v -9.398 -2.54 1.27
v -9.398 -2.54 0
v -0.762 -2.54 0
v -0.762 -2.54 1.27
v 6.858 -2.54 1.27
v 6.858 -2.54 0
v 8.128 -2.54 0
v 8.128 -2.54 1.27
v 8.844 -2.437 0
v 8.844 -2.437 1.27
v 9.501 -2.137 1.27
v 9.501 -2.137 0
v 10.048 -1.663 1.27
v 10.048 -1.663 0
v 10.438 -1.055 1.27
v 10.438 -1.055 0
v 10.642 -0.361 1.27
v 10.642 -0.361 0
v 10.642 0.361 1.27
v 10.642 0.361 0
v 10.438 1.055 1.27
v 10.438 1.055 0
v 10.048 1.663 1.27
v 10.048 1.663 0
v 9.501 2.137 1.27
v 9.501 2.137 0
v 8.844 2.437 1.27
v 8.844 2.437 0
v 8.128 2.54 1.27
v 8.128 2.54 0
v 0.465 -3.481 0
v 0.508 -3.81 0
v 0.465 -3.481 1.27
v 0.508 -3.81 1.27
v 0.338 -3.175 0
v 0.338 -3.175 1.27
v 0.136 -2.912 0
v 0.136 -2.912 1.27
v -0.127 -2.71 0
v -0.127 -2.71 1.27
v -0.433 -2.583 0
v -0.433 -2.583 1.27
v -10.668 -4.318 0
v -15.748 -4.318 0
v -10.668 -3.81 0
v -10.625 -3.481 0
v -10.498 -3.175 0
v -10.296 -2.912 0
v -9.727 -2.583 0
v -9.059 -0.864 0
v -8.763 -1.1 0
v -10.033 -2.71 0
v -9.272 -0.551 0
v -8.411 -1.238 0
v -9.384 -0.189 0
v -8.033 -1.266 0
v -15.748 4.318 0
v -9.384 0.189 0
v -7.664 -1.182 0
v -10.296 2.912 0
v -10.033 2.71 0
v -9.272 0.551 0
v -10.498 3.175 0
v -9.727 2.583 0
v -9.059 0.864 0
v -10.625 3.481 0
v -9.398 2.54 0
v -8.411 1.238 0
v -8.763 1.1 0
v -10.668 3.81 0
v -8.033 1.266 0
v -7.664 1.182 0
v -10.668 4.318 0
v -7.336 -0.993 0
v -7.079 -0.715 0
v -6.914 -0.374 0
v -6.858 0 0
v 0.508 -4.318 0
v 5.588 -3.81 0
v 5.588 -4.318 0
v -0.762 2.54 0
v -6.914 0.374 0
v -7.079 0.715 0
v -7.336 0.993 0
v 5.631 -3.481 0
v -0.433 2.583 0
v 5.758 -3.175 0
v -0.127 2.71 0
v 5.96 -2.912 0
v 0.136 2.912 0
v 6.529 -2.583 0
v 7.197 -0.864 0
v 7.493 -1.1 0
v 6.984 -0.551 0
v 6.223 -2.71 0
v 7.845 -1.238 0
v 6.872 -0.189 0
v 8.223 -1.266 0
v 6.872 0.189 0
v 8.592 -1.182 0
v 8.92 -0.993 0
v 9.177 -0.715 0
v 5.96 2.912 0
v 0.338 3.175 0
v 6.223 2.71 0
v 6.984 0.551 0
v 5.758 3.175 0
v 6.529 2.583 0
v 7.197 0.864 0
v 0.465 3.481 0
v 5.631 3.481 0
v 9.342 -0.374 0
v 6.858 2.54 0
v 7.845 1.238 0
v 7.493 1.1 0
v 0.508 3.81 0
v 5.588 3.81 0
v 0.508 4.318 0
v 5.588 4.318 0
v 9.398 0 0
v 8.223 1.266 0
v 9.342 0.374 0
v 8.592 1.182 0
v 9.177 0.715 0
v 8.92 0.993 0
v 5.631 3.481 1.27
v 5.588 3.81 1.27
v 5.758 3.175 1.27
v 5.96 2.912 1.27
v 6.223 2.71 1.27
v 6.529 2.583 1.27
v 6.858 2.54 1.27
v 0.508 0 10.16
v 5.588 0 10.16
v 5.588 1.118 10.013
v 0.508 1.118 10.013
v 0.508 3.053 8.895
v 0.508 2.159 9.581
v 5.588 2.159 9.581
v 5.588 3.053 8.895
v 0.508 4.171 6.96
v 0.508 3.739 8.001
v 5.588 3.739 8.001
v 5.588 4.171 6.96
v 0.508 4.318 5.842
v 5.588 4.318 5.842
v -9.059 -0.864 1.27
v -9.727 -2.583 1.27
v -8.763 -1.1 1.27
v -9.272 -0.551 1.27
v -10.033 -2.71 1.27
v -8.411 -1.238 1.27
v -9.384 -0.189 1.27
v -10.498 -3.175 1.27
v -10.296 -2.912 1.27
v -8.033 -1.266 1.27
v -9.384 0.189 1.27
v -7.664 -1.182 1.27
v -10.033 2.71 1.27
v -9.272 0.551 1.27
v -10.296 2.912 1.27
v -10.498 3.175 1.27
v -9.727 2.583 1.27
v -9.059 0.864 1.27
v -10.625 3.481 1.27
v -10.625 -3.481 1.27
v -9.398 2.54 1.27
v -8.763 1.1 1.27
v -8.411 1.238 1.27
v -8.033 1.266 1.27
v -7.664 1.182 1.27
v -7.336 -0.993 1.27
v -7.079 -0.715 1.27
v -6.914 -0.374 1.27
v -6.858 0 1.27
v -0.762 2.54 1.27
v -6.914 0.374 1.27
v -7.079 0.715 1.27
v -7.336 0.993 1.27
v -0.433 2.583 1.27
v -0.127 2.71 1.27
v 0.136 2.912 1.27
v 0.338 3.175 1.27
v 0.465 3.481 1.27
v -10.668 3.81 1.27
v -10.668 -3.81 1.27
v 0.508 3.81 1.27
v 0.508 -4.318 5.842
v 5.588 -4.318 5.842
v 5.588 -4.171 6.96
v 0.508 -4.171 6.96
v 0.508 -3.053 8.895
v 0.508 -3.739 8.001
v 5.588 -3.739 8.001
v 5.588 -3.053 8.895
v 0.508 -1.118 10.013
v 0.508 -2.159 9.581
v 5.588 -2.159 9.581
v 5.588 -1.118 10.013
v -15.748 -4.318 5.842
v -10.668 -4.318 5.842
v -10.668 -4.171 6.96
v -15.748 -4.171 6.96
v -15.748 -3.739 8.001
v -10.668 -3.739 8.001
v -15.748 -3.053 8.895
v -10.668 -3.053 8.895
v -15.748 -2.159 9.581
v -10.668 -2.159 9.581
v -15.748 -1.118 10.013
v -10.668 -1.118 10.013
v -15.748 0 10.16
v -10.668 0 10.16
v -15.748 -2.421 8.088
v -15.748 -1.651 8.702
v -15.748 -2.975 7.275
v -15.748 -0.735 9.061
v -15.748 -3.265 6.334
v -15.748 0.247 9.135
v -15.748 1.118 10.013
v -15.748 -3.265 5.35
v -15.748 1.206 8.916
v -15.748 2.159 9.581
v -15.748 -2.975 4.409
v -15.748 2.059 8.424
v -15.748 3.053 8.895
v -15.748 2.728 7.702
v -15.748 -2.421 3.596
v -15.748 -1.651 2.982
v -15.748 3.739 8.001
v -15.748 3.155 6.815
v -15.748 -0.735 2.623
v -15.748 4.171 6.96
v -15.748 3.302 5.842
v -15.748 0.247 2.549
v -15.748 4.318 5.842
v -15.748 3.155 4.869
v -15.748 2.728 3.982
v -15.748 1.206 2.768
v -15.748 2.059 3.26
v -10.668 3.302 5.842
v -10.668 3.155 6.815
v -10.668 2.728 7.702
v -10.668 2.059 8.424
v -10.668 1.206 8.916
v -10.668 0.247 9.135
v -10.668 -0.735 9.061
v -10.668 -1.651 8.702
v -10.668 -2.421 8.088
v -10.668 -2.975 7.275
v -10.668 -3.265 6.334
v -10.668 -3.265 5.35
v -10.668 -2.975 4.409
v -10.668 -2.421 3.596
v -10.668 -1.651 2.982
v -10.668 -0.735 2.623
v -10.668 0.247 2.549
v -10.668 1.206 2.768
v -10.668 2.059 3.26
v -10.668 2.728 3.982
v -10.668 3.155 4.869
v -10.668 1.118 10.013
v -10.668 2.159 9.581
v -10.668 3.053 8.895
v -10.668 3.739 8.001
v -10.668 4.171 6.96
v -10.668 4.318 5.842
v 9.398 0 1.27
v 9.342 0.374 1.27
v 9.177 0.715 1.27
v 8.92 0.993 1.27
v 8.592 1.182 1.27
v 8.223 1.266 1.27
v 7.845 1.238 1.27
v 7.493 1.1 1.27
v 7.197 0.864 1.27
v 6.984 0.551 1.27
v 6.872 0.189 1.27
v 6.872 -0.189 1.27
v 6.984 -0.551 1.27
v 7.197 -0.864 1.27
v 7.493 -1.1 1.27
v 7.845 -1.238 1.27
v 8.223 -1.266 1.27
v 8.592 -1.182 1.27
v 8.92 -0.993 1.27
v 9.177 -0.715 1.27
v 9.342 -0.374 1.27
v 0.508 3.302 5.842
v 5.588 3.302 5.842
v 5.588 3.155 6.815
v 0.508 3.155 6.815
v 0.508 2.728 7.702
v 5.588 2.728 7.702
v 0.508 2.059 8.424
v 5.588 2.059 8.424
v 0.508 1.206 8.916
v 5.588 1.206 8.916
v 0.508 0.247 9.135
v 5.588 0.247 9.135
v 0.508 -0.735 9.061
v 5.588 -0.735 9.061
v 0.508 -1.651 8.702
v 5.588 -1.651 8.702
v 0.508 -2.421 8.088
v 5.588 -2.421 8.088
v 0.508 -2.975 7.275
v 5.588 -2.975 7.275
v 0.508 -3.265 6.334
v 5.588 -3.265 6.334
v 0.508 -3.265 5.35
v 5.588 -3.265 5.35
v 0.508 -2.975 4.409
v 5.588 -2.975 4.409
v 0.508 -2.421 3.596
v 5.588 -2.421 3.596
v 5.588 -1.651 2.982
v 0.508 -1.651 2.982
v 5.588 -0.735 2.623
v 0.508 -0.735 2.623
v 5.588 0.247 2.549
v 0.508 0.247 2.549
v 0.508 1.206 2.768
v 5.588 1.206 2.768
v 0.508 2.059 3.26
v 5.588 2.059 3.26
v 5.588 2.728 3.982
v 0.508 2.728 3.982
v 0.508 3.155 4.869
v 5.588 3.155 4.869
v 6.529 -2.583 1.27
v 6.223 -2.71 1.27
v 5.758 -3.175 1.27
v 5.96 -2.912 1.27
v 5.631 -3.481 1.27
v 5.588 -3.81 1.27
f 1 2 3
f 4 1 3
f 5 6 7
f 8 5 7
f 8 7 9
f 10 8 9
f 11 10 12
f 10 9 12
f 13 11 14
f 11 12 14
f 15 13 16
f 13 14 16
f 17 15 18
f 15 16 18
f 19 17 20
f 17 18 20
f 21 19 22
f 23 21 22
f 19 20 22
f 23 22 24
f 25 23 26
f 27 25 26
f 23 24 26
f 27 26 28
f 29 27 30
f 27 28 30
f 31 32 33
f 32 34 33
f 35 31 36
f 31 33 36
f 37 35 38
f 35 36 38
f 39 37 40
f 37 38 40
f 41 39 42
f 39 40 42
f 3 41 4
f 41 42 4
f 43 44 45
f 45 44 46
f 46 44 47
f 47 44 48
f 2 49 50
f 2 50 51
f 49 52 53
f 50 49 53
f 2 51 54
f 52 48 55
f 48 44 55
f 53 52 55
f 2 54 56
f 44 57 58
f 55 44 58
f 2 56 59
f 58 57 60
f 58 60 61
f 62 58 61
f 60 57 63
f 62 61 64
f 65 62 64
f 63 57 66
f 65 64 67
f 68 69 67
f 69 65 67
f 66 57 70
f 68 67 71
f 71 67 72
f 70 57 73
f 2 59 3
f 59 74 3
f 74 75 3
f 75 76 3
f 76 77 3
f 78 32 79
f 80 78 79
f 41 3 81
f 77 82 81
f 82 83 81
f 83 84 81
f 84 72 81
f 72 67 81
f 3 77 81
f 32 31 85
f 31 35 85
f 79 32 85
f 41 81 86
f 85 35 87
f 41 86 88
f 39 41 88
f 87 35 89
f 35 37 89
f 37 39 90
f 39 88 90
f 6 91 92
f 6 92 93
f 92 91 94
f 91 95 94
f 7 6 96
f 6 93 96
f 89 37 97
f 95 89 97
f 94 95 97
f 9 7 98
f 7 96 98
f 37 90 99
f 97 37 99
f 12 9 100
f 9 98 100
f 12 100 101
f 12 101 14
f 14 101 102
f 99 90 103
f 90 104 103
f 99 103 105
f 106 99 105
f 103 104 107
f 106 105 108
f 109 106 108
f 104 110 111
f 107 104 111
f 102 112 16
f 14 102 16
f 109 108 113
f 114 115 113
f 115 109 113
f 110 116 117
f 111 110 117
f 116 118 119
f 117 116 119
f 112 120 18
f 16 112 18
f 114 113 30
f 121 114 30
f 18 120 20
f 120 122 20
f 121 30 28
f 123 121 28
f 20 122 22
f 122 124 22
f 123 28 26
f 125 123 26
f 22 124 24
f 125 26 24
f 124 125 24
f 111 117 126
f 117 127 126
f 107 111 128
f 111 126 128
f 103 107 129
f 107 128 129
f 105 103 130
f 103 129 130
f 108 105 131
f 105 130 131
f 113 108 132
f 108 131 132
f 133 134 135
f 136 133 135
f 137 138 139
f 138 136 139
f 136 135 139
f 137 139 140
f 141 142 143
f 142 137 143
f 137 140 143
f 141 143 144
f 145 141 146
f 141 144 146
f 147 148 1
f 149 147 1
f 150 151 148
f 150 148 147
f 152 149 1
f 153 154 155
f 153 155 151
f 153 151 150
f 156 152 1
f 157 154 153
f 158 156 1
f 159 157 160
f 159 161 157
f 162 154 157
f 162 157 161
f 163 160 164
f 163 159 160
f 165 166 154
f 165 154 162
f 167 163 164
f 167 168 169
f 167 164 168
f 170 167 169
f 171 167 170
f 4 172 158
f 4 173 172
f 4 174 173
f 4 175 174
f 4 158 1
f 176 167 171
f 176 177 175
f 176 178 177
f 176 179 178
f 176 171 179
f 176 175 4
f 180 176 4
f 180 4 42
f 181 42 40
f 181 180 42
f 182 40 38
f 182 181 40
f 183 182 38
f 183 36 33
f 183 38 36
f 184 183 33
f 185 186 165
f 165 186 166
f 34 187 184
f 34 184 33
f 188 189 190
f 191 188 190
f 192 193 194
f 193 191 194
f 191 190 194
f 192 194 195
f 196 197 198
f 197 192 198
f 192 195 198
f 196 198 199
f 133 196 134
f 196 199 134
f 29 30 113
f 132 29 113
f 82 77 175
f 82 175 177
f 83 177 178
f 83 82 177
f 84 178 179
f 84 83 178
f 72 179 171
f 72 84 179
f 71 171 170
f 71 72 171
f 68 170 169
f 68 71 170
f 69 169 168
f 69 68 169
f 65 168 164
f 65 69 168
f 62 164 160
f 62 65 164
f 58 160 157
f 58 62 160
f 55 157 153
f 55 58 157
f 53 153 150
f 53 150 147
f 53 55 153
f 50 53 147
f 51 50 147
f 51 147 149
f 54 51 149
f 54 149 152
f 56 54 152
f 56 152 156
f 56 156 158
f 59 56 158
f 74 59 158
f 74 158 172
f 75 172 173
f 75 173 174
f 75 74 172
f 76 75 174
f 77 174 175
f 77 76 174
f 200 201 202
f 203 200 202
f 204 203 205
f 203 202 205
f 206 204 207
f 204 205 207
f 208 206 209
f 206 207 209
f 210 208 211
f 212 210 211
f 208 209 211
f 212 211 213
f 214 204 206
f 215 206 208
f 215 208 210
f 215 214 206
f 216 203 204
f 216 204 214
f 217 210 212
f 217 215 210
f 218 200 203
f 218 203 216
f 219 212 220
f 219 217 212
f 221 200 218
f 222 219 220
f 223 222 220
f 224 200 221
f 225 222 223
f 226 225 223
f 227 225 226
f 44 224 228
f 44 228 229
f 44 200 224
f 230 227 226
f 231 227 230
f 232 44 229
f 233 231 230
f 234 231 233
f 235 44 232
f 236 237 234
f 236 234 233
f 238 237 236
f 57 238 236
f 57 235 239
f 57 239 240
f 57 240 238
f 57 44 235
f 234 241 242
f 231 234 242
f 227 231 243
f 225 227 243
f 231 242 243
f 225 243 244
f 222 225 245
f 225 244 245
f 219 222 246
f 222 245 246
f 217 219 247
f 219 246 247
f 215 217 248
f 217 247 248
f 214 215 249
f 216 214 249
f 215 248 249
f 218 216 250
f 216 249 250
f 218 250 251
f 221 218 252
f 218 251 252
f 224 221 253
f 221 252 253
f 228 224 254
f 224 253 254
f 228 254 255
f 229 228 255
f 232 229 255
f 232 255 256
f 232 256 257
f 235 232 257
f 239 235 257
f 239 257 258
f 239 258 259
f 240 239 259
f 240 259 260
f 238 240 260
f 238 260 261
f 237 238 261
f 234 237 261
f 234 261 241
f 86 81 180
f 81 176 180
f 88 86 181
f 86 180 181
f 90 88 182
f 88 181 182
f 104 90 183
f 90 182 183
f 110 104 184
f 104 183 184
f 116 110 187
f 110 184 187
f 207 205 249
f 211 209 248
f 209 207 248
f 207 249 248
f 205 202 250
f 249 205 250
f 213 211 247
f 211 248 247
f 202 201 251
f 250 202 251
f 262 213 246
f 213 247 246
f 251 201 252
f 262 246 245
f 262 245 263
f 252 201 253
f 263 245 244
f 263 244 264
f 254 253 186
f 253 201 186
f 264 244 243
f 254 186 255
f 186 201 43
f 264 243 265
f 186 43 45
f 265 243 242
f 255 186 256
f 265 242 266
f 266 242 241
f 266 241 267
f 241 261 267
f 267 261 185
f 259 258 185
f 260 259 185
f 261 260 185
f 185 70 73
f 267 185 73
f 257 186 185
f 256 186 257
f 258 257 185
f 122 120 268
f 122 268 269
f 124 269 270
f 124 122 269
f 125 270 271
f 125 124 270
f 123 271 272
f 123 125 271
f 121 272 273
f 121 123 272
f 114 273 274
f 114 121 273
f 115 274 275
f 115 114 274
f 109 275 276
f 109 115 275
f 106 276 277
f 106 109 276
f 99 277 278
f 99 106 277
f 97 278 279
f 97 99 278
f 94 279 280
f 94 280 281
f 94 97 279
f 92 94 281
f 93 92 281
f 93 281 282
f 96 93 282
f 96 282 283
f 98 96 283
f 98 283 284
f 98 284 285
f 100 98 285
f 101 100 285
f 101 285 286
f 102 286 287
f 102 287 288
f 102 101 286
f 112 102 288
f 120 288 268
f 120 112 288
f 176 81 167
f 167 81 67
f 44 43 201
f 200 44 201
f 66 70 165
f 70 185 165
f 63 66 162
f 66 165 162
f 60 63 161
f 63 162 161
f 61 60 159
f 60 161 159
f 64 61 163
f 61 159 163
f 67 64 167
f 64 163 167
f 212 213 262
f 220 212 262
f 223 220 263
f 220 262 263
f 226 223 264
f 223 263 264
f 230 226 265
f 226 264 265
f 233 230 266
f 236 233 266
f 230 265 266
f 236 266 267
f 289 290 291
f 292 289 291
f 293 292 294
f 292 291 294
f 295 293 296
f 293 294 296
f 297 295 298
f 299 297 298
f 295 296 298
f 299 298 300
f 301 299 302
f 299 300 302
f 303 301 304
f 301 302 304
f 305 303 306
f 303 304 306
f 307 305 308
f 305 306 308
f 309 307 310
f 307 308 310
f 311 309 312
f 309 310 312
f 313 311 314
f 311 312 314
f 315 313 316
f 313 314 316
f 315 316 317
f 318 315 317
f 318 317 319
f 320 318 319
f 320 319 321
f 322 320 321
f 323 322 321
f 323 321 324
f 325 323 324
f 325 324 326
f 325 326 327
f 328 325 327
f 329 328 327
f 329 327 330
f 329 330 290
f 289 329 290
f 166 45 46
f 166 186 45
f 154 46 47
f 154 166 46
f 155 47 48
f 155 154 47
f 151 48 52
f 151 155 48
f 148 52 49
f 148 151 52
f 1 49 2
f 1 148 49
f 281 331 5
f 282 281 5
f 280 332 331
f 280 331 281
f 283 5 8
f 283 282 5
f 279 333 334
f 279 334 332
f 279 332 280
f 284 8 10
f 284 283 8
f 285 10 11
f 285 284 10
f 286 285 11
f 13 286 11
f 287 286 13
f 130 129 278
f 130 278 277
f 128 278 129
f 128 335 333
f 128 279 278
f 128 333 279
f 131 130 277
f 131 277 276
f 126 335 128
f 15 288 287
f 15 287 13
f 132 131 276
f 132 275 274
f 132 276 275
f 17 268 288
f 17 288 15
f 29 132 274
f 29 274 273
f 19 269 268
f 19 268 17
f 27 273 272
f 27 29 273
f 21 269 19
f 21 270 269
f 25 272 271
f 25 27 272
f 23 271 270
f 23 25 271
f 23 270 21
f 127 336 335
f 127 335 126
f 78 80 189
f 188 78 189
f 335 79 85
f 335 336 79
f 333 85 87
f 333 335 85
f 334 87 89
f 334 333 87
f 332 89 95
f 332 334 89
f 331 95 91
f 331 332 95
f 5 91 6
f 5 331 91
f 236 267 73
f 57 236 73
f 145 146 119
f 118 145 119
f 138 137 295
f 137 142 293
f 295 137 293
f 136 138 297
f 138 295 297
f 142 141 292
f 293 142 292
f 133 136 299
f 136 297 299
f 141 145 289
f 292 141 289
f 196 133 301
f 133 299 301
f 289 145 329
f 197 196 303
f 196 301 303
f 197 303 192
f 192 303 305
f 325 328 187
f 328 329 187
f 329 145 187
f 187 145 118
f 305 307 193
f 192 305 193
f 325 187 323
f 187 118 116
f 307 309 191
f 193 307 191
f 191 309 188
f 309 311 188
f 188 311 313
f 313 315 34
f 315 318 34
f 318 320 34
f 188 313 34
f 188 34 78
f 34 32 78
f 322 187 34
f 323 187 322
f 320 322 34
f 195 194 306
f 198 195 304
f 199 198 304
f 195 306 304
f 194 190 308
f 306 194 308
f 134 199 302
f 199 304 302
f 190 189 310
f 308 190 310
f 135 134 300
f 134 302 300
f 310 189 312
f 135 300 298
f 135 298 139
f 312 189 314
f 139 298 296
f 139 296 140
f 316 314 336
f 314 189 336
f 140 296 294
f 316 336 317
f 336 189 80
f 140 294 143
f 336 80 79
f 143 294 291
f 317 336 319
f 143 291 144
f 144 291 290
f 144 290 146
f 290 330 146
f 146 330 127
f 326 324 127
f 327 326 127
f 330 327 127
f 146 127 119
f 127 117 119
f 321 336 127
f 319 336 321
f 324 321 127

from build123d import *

# Parameters (mm, degrees)
F0_R     = 1.27
F1_DEPTH = 1.27
F2_W     = 5.08
F2_H     = 11.43
F3_DEPTH = 8.89
F4_R     = 3.302
F5_DEPTH = 21.336
F6_R     = 1.27


with BuildPart() as f1:
    # F0 (on Top) → F1 (new body)
    with BuildSketch(Plane.XY):
        with BuildLine():
            Line((-10.668, 5.715), (-15.748, 5.715))
            Line((-15.748, 5.715), (-15.748, -5.715))
            Line((-15.748, -5.715), (-10.668, -5.715))
            Line((-10.668, -5.715), (-10.668, -2.54))
            Line((-10.668, -2.54), (0.508, -2.54))
            Line((0.508, -2.54), (0.508, -5.715))
            Line((0.508, -5.715), (5.588, -5.715))
            Line((5.588, -5.715), (5.588, -2.54))
            Line((5.588, -2.54), (8.128, -2.54))
            ThreePointArc((8.128, -2.54), (10.668, 0), (8.128, 2.54))
            Line((8.128, 2.54), (5.588, 2.54))
            Line((5.588, 2.54), (5.588, 5.715))
            Line((5.588, 5.715), (0.508, 5.715))
            Line((0.508, 5.715), (0.508, 2.54))
            Line((0.508, 2.54), (-10.668, 2.54))
            Line((-10.668, 2.54), (-10.668, 5.715))
        make_face()
        with Locations((-8.128, 0)):
            Circle(F0_R, mode=Mode.SUBTRACT)
        with Locations((8.128, 0)):
            Circle(F0_R, mode=Mode.SUBTRACT)
    extrude(amount=F1_DEPTH)

    # F2 (on face) → F3 (join)
    with BuildSketch(Plane.XY.offset(1.27)):
        with Locations((-13.208, 0)):
            Rectangle(F2_W, F2_H)
        with Locations((3.048, 0)):
            Rectangle(F2_W, F2_H)
    extrude(amount=F3_DEPTH)

    # F4 (on face) → F5 (cut, through all)
    with BuildSketch(Plane.YZ.offset(5.588)):
        with Locations((0, 5.842)):
            Circle(F4_R)
        with BuildLine():
            Line((5.715, 10.16), (0, 10.16))
            ThreePointArc((0, 10.16), (3.053287, 8.895287), (4.318, 5.842))
            Line((4.318, 5.842), (4.318, 0))
            Line((4.318, 0), (5.715, 0))
            Line((5.715, 0), (5.715, 10.16))
        make_face()
        with BuildLine():
            Line((-5.715, 0), (-4.318, 0))
            Line((-4.318, 0), (-4.318, 5.842))
            ThreePointArc((-4.318, 5.842), (-3.053287, 8.895287), (0, 10.16))
            Line((0, 10.16), (-5.715, 10.16))
            Line((-5.715, 10.16), (-5.715, 0))
        make_face()
    extrude(amount=-F5_DEPTH, mode=Mode.SUBTRACT)

    # F6
    f6_edges = [f1.edges().sort_by_distance(p)[0] for p in [
        (-10.668, -2.54, 0.635),
        (5.588, -2.54, 0.635),
        (0.508, -2.54, 0.635),
        (0.508, 2.54, 0.635),
        (5.588, 2.54, 0.635),
        (-10.668, 2.54, 0.635),
    ]]
    fillet(f6_edges, radius=F6_R)


solid = f1.part
